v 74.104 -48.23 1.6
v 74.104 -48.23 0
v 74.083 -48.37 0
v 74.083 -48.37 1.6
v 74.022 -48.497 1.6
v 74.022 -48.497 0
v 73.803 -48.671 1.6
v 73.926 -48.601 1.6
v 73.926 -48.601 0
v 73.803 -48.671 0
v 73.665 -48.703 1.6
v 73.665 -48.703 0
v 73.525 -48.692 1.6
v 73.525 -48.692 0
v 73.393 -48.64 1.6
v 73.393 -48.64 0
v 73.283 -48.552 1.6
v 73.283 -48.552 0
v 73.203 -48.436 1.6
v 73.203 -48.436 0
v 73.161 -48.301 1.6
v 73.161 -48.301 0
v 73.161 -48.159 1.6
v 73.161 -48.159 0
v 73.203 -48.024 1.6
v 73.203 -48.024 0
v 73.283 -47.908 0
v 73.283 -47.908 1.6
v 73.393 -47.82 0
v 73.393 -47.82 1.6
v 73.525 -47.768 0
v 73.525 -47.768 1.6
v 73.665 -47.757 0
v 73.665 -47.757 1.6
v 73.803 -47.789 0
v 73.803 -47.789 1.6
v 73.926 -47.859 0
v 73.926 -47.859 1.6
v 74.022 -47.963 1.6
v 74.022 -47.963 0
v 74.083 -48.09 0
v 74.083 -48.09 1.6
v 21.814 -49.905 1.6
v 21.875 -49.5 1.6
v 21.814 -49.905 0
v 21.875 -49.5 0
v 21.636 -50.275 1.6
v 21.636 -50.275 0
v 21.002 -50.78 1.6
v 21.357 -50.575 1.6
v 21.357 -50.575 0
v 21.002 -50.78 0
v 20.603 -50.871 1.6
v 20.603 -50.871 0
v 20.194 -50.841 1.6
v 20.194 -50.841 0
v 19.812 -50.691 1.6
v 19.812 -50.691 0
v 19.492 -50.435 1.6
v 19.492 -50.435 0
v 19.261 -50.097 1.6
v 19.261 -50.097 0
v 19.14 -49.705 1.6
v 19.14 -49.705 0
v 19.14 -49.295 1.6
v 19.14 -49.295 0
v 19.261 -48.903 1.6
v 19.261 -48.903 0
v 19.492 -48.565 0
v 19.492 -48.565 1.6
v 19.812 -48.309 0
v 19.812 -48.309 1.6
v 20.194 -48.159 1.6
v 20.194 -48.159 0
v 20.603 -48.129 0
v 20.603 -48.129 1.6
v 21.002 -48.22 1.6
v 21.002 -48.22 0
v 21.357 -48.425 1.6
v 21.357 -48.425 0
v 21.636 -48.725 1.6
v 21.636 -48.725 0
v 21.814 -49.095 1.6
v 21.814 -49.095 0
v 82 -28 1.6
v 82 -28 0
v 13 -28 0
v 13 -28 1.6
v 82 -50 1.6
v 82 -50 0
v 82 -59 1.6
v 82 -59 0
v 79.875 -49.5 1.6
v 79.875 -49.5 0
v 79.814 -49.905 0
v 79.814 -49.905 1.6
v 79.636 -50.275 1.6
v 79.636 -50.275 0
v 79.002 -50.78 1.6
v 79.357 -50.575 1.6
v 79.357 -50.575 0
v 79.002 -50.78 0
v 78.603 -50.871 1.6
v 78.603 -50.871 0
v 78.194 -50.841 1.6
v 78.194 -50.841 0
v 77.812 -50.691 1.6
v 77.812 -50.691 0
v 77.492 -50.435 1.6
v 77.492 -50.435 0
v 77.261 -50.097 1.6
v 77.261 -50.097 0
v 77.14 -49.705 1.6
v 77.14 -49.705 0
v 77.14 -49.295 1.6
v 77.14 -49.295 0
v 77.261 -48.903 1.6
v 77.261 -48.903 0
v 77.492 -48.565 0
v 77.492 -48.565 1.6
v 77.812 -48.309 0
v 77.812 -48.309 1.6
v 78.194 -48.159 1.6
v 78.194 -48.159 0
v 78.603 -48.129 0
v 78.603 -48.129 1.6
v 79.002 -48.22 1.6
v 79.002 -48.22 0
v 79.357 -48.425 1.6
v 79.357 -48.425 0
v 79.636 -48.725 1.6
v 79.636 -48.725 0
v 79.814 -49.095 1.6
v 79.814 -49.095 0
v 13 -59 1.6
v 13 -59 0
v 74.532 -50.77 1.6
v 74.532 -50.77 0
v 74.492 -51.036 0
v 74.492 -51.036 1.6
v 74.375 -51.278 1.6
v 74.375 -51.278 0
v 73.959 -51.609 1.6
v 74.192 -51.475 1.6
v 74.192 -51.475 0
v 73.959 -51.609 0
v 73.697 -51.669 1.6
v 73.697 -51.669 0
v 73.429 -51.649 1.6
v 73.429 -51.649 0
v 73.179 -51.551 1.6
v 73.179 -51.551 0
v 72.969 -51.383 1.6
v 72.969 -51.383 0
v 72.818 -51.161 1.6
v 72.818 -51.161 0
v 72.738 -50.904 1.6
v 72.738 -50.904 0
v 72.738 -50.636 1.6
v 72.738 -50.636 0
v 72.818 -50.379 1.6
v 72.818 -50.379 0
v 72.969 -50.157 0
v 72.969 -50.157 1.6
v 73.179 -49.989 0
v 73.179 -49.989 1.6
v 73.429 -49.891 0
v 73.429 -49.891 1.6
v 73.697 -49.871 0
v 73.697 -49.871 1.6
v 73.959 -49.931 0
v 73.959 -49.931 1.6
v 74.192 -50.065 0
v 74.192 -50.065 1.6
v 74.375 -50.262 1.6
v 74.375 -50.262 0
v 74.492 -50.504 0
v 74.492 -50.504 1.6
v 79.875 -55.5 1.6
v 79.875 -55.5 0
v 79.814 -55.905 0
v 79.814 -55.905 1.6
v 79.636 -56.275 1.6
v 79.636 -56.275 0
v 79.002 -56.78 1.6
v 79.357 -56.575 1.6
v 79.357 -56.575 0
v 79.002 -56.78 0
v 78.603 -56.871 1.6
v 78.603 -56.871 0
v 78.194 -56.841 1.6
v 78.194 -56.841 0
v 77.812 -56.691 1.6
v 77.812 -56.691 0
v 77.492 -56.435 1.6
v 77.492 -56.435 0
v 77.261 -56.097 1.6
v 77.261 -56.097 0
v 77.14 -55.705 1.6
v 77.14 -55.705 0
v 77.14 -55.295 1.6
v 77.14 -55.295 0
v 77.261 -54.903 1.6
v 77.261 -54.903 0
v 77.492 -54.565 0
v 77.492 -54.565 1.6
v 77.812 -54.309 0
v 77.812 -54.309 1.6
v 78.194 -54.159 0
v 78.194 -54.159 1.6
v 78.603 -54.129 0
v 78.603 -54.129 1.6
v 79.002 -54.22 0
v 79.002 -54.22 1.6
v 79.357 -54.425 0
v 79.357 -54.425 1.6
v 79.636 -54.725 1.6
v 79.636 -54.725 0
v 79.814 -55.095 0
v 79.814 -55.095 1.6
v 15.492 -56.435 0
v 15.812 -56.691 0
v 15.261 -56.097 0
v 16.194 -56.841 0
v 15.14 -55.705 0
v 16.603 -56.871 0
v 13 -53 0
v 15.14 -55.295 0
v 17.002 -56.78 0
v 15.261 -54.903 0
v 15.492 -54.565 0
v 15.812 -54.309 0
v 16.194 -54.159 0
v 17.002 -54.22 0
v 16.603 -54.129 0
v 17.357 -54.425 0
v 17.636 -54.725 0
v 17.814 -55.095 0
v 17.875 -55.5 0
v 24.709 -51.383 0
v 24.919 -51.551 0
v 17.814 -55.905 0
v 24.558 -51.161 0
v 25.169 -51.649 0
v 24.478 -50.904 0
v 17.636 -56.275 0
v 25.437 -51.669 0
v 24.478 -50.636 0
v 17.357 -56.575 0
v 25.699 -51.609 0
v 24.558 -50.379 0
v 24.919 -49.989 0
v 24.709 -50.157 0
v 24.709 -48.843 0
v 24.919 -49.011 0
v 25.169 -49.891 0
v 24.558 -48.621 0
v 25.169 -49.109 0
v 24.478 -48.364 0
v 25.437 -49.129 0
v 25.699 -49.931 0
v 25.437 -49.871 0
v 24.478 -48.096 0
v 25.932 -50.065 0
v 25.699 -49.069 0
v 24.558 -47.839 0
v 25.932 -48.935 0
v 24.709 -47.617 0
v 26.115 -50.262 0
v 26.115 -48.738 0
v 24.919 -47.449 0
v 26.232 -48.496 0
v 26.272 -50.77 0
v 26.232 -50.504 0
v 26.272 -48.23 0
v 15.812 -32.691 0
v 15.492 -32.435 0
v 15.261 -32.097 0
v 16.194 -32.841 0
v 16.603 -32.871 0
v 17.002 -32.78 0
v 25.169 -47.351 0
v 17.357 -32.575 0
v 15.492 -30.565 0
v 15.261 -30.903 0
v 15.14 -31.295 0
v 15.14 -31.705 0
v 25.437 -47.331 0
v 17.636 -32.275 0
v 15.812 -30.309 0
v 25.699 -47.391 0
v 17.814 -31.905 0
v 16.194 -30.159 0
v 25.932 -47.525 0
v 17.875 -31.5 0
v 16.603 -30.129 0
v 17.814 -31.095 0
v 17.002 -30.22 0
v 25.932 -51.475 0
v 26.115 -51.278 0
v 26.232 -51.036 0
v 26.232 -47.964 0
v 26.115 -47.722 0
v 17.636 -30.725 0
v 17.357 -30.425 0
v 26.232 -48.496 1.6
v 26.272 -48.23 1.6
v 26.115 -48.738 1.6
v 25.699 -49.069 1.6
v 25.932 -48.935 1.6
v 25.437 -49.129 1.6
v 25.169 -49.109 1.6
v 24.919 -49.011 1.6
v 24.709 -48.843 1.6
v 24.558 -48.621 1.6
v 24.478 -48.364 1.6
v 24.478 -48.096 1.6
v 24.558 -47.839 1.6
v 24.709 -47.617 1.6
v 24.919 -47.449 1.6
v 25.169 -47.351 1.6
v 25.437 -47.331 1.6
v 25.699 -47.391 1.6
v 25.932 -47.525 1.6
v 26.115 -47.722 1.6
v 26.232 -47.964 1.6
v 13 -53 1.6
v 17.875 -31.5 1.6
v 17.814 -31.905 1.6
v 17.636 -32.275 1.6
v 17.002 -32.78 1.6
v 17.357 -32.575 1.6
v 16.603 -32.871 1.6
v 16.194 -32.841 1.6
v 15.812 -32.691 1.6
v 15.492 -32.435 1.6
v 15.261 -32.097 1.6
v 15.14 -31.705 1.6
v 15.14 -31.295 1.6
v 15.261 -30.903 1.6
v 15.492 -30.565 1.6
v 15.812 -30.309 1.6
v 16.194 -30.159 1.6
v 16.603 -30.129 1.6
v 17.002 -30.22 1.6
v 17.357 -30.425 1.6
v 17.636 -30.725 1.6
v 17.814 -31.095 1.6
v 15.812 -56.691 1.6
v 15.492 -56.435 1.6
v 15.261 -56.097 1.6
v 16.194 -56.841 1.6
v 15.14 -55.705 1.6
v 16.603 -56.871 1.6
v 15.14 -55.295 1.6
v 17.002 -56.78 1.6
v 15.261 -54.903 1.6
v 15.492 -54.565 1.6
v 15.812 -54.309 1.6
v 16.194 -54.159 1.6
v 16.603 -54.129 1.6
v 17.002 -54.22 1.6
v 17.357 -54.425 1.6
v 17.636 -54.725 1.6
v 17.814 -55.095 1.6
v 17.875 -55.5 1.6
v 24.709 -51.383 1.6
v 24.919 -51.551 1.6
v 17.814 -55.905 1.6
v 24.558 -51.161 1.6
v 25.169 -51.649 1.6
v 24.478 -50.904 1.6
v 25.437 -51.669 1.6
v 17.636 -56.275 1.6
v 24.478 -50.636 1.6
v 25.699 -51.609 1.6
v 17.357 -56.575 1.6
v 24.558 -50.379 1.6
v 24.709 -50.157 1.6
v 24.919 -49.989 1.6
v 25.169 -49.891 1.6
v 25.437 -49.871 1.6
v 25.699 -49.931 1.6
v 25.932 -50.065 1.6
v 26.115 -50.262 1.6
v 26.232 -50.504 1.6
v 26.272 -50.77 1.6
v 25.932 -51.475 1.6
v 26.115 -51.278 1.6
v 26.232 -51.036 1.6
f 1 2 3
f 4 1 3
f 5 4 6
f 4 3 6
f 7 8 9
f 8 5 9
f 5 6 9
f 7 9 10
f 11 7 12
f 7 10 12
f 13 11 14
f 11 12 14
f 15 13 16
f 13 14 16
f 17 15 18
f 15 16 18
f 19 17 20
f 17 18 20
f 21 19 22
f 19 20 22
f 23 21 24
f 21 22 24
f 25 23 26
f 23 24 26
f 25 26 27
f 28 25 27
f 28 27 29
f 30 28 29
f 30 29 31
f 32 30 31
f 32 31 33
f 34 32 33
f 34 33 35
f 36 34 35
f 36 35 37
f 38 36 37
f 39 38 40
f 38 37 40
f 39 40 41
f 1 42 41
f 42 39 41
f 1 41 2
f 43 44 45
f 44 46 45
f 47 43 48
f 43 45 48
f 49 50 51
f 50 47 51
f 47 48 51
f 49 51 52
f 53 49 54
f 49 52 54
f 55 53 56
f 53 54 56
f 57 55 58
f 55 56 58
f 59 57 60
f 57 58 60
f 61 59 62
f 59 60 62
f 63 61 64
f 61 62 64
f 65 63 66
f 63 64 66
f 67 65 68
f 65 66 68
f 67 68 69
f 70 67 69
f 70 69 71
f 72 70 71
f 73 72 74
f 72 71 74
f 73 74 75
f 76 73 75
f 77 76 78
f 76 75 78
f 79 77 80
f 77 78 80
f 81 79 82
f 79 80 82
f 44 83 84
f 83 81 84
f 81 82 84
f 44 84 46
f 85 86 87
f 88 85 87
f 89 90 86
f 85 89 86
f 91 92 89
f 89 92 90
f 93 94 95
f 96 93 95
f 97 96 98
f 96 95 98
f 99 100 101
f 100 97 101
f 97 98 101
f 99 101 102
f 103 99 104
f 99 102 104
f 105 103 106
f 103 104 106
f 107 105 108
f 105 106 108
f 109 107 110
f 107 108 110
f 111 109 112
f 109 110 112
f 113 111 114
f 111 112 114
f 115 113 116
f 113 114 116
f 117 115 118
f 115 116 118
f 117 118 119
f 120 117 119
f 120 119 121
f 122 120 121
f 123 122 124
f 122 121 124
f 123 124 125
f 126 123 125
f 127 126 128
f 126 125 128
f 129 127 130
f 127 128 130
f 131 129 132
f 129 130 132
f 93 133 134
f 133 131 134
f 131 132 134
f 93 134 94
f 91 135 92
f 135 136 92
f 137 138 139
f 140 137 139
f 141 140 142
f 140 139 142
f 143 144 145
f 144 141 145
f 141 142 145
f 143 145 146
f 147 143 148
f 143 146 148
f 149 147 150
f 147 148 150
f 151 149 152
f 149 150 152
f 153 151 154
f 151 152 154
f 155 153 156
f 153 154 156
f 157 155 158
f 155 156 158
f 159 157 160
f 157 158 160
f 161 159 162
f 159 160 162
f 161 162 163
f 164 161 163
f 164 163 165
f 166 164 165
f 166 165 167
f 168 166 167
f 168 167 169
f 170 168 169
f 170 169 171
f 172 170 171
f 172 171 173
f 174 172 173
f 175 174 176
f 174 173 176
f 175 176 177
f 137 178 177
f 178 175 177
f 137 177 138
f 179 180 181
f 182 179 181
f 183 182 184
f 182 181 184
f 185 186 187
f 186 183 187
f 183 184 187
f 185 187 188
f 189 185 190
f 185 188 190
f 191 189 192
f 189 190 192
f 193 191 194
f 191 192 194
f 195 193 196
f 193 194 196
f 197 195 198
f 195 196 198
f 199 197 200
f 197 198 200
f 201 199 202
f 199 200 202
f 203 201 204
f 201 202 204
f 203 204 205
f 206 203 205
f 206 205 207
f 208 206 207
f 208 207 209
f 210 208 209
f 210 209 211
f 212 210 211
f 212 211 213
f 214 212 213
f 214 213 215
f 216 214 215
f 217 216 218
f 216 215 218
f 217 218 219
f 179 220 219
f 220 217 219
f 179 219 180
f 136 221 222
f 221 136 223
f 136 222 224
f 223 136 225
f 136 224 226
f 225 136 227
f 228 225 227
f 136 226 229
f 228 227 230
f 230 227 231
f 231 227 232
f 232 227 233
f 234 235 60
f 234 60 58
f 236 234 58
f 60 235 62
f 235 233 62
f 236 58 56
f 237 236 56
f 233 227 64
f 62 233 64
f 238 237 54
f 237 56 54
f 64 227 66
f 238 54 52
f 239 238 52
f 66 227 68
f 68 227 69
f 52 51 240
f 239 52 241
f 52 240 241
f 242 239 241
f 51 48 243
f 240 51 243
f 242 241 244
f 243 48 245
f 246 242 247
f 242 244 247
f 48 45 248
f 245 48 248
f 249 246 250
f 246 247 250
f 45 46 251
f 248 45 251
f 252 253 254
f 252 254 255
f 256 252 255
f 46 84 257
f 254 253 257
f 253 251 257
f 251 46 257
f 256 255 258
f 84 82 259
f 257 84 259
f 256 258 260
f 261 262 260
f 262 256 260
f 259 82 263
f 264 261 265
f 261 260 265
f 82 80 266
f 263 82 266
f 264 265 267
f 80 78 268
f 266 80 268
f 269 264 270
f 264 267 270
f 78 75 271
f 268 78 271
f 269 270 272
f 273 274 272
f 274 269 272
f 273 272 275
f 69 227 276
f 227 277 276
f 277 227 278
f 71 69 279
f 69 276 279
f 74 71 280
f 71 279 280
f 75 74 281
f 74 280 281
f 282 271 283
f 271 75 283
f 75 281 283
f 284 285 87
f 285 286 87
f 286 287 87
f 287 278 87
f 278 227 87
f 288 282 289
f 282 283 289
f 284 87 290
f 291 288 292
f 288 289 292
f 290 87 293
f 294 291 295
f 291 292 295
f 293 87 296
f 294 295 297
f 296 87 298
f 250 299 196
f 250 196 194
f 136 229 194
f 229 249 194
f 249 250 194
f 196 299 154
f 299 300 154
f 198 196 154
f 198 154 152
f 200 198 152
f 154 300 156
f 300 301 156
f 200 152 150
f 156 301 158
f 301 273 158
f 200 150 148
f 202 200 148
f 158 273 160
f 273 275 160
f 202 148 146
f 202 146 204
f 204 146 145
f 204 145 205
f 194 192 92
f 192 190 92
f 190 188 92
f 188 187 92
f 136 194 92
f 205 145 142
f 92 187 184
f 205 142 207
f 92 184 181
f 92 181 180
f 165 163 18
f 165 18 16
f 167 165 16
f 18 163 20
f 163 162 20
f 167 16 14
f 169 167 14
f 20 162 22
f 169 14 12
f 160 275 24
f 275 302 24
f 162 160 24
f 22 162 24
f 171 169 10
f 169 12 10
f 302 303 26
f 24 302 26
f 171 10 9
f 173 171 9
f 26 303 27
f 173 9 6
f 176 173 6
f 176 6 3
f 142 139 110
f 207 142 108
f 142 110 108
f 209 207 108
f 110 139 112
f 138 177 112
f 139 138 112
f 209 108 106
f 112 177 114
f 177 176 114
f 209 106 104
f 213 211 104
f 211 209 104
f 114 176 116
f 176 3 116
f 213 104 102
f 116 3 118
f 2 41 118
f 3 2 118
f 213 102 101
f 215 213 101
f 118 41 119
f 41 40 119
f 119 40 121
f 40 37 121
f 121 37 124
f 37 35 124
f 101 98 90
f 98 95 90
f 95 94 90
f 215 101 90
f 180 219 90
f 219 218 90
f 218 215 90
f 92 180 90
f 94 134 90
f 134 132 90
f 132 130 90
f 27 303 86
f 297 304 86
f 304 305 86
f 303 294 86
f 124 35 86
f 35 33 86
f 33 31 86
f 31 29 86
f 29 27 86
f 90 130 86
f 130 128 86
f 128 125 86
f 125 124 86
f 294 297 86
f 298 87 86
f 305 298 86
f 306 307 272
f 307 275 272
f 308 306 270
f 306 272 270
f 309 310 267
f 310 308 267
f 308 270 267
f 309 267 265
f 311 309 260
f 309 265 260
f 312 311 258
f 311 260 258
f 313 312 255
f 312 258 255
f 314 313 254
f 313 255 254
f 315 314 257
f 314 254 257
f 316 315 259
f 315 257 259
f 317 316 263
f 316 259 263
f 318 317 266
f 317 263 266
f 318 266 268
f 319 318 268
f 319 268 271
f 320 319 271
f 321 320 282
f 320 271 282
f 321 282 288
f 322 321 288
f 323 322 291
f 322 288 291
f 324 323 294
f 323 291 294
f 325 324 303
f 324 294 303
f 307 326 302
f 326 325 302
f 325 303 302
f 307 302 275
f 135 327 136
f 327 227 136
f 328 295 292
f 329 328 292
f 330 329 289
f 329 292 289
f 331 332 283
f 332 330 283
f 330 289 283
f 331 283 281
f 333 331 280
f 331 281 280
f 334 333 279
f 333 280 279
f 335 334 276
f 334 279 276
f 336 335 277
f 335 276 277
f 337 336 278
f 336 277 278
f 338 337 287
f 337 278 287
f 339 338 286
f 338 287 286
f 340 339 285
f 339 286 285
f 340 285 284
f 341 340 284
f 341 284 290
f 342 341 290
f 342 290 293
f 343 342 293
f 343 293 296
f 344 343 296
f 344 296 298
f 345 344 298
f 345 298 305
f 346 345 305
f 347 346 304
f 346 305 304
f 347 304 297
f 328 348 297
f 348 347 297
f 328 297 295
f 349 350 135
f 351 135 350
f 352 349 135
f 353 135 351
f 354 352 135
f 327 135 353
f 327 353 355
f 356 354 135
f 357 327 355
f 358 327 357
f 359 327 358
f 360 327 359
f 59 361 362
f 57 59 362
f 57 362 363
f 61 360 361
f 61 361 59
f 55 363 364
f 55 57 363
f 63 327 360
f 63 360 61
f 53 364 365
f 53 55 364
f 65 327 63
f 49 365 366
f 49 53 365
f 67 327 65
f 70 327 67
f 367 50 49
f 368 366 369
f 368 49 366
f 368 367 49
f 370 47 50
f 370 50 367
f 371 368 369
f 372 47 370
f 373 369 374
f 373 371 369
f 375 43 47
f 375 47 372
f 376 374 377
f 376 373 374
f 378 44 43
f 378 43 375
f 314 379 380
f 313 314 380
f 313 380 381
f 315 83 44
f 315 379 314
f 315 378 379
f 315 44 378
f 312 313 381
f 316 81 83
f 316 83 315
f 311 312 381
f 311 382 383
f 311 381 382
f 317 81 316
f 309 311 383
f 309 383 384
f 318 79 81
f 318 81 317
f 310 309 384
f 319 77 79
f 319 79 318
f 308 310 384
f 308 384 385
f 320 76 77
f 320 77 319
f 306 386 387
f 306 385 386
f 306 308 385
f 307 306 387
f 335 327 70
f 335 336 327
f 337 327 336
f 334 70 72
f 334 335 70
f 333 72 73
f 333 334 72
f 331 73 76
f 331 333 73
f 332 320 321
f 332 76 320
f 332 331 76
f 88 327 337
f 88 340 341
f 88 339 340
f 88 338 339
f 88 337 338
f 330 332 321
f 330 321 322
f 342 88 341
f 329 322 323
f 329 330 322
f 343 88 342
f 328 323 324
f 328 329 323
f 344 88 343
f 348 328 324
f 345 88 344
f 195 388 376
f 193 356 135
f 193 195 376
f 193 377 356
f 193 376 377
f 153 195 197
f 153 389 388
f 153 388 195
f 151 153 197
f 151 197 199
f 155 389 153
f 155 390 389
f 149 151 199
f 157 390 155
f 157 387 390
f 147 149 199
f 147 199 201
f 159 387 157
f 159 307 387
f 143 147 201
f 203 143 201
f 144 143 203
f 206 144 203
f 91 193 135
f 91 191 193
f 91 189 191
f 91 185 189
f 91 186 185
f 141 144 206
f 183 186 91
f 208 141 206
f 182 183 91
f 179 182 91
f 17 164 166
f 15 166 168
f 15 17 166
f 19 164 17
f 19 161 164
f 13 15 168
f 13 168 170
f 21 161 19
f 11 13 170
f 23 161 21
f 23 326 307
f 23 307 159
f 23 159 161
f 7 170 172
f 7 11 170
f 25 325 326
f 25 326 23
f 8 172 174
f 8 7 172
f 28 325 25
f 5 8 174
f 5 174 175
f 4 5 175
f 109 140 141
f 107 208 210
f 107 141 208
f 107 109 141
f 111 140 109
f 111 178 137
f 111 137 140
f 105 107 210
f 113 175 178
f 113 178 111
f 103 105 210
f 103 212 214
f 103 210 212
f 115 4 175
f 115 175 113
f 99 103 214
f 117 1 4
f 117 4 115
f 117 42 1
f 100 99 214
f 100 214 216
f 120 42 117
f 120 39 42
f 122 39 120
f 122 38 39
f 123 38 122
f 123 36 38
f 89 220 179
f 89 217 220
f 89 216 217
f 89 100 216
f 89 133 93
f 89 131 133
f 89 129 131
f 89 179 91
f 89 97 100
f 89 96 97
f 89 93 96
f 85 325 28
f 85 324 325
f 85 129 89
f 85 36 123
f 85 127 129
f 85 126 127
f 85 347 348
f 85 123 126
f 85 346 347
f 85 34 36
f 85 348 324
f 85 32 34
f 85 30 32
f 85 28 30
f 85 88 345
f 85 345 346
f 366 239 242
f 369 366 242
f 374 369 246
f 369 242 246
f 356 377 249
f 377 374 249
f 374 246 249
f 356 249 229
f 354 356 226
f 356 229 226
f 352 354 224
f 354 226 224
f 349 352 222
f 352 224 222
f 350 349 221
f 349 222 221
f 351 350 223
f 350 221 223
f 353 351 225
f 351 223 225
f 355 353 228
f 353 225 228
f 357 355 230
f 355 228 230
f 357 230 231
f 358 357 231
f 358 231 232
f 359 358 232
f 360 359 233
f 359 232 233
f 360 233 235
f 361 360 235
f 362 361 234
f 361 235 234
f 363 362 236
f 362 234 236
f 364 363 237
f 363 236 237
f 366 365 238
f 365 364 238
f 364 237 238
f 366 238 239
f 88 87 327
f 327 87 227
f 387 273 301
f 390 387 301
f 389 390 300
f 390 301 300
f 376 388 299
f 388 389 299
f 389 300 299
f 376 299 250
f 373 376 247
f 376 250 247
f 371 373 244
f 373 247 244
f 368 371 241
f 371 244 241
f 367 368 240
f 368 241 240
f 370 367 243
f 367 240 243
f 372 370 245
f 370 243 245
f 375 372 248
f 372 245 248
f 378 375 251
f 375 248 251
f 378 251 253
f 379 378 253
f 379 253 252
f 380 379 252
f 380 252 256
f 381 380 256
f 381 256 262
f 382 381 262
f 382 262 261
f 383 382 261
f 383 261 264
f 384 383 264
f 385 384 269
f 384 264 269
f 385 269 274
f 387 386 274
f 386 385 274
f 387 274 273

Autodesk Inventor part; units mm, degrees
ref_plane "YZ Plane" through (0, 0, 0) normal (1, 0, 0) x (0, 1, 0)
ref_plane "XZ Plane" through (0, 0, 0) normal (0, 1, 0) x (-1, 0, 0)
ref_plane "XY Plane" through (0, 0, 0) normal (0, 0, 1) x (1, 0, 0)
sketch "Sketch1" plane through (0, 0, 0) normal (0, 0, 1) x (1, 0, 0)
  line L0 (0, -53) -> (79, -53) projected
  line L1 (82, -50) -> (82, 0) projected
  circle A0 centre (78.5, -49.5) radius 1.375 projected
  circle A1 centre (20.5, -49.5) radius 1.375 projected
  line L2 (35.3891, -15.1062) -> (35.3891, -19.5) projected
  line L3 (35.3891, -19.5) -> (38.2391, -19.5) projected
  line L4 (38.2391, -19.5) -> (38.2391, -16.9) projected
  line L5 (38.2391, -16.9) -> (36.6891, -16.9) projected
  line L6 (36.6891, -16.9) -> (36.6891, -0.1) projected
  line L7 (36.6891, -0.1) -> (38.2391, -0.1) projected
  line L8 (38.2391, -0.1) -> (38.2391, 2.5) projected
  line L9 (38.2391, 2.5) -> (35.3891, 2.5) projected
  line L10 (35.3891, 2.5) -> (35.3891, -1.8938) projected
  line L11 (35.3891, -1.8938) -> (34.3391, -2.5) projected
  line L12 (34.3391, -2.5) -> (34.3391, -14.5) projected
  line L13 (34.3391, -14.5) -> (35.3891, -15.1062) projected
  line L14 (12.09, -50.25) -> (12.09, -37.75) projected
  circle A2 centre (25.37, -48.23) radius 0.9016 projected
  circle A3 centre (25.37, -50.77) radius 0.9016 projected
  circle A4 centre (73.63, -50.77) radius 0.9016 projected
  circle A5 centre (73.63, -48.23) radius 0.474 projected
  line L15 (13, -59) -> (82, -59)
  line L16 (82, -59) -> (82, -28)
  line L17 (82, -28) -> (13, -28)
  line L18 (13, -28) -> (13, -59)
  circle A6 centre (16.5, -55.5) radius 1.375
  circle A7 centre (16.5, -31.5) radius 1.375
  circle A8 centre (78.5, -55.5) radius 1.375
  point P0 (0, 0)
  dimension "d0" = 69
  dimension "d1" = 6
  dimension "d2" = 25
  dimension "d3" = 2.75
  dimension "d4" = 3.5
  dimension "d5" = 3.5
  dimension "d6" = 2.75
  dimension "d7" = 3.5
  dimension "d8" = 3.5
  dimension "d9" = 2.75
  dimension "d10" = 3.5
  dimension "d11" = 3.5
extrude "Extrusion1" add sketch "Sketch1" along normal blind 1.6 contours L16 L15 L18 L17 L1
properties part number "ShieldBare"
